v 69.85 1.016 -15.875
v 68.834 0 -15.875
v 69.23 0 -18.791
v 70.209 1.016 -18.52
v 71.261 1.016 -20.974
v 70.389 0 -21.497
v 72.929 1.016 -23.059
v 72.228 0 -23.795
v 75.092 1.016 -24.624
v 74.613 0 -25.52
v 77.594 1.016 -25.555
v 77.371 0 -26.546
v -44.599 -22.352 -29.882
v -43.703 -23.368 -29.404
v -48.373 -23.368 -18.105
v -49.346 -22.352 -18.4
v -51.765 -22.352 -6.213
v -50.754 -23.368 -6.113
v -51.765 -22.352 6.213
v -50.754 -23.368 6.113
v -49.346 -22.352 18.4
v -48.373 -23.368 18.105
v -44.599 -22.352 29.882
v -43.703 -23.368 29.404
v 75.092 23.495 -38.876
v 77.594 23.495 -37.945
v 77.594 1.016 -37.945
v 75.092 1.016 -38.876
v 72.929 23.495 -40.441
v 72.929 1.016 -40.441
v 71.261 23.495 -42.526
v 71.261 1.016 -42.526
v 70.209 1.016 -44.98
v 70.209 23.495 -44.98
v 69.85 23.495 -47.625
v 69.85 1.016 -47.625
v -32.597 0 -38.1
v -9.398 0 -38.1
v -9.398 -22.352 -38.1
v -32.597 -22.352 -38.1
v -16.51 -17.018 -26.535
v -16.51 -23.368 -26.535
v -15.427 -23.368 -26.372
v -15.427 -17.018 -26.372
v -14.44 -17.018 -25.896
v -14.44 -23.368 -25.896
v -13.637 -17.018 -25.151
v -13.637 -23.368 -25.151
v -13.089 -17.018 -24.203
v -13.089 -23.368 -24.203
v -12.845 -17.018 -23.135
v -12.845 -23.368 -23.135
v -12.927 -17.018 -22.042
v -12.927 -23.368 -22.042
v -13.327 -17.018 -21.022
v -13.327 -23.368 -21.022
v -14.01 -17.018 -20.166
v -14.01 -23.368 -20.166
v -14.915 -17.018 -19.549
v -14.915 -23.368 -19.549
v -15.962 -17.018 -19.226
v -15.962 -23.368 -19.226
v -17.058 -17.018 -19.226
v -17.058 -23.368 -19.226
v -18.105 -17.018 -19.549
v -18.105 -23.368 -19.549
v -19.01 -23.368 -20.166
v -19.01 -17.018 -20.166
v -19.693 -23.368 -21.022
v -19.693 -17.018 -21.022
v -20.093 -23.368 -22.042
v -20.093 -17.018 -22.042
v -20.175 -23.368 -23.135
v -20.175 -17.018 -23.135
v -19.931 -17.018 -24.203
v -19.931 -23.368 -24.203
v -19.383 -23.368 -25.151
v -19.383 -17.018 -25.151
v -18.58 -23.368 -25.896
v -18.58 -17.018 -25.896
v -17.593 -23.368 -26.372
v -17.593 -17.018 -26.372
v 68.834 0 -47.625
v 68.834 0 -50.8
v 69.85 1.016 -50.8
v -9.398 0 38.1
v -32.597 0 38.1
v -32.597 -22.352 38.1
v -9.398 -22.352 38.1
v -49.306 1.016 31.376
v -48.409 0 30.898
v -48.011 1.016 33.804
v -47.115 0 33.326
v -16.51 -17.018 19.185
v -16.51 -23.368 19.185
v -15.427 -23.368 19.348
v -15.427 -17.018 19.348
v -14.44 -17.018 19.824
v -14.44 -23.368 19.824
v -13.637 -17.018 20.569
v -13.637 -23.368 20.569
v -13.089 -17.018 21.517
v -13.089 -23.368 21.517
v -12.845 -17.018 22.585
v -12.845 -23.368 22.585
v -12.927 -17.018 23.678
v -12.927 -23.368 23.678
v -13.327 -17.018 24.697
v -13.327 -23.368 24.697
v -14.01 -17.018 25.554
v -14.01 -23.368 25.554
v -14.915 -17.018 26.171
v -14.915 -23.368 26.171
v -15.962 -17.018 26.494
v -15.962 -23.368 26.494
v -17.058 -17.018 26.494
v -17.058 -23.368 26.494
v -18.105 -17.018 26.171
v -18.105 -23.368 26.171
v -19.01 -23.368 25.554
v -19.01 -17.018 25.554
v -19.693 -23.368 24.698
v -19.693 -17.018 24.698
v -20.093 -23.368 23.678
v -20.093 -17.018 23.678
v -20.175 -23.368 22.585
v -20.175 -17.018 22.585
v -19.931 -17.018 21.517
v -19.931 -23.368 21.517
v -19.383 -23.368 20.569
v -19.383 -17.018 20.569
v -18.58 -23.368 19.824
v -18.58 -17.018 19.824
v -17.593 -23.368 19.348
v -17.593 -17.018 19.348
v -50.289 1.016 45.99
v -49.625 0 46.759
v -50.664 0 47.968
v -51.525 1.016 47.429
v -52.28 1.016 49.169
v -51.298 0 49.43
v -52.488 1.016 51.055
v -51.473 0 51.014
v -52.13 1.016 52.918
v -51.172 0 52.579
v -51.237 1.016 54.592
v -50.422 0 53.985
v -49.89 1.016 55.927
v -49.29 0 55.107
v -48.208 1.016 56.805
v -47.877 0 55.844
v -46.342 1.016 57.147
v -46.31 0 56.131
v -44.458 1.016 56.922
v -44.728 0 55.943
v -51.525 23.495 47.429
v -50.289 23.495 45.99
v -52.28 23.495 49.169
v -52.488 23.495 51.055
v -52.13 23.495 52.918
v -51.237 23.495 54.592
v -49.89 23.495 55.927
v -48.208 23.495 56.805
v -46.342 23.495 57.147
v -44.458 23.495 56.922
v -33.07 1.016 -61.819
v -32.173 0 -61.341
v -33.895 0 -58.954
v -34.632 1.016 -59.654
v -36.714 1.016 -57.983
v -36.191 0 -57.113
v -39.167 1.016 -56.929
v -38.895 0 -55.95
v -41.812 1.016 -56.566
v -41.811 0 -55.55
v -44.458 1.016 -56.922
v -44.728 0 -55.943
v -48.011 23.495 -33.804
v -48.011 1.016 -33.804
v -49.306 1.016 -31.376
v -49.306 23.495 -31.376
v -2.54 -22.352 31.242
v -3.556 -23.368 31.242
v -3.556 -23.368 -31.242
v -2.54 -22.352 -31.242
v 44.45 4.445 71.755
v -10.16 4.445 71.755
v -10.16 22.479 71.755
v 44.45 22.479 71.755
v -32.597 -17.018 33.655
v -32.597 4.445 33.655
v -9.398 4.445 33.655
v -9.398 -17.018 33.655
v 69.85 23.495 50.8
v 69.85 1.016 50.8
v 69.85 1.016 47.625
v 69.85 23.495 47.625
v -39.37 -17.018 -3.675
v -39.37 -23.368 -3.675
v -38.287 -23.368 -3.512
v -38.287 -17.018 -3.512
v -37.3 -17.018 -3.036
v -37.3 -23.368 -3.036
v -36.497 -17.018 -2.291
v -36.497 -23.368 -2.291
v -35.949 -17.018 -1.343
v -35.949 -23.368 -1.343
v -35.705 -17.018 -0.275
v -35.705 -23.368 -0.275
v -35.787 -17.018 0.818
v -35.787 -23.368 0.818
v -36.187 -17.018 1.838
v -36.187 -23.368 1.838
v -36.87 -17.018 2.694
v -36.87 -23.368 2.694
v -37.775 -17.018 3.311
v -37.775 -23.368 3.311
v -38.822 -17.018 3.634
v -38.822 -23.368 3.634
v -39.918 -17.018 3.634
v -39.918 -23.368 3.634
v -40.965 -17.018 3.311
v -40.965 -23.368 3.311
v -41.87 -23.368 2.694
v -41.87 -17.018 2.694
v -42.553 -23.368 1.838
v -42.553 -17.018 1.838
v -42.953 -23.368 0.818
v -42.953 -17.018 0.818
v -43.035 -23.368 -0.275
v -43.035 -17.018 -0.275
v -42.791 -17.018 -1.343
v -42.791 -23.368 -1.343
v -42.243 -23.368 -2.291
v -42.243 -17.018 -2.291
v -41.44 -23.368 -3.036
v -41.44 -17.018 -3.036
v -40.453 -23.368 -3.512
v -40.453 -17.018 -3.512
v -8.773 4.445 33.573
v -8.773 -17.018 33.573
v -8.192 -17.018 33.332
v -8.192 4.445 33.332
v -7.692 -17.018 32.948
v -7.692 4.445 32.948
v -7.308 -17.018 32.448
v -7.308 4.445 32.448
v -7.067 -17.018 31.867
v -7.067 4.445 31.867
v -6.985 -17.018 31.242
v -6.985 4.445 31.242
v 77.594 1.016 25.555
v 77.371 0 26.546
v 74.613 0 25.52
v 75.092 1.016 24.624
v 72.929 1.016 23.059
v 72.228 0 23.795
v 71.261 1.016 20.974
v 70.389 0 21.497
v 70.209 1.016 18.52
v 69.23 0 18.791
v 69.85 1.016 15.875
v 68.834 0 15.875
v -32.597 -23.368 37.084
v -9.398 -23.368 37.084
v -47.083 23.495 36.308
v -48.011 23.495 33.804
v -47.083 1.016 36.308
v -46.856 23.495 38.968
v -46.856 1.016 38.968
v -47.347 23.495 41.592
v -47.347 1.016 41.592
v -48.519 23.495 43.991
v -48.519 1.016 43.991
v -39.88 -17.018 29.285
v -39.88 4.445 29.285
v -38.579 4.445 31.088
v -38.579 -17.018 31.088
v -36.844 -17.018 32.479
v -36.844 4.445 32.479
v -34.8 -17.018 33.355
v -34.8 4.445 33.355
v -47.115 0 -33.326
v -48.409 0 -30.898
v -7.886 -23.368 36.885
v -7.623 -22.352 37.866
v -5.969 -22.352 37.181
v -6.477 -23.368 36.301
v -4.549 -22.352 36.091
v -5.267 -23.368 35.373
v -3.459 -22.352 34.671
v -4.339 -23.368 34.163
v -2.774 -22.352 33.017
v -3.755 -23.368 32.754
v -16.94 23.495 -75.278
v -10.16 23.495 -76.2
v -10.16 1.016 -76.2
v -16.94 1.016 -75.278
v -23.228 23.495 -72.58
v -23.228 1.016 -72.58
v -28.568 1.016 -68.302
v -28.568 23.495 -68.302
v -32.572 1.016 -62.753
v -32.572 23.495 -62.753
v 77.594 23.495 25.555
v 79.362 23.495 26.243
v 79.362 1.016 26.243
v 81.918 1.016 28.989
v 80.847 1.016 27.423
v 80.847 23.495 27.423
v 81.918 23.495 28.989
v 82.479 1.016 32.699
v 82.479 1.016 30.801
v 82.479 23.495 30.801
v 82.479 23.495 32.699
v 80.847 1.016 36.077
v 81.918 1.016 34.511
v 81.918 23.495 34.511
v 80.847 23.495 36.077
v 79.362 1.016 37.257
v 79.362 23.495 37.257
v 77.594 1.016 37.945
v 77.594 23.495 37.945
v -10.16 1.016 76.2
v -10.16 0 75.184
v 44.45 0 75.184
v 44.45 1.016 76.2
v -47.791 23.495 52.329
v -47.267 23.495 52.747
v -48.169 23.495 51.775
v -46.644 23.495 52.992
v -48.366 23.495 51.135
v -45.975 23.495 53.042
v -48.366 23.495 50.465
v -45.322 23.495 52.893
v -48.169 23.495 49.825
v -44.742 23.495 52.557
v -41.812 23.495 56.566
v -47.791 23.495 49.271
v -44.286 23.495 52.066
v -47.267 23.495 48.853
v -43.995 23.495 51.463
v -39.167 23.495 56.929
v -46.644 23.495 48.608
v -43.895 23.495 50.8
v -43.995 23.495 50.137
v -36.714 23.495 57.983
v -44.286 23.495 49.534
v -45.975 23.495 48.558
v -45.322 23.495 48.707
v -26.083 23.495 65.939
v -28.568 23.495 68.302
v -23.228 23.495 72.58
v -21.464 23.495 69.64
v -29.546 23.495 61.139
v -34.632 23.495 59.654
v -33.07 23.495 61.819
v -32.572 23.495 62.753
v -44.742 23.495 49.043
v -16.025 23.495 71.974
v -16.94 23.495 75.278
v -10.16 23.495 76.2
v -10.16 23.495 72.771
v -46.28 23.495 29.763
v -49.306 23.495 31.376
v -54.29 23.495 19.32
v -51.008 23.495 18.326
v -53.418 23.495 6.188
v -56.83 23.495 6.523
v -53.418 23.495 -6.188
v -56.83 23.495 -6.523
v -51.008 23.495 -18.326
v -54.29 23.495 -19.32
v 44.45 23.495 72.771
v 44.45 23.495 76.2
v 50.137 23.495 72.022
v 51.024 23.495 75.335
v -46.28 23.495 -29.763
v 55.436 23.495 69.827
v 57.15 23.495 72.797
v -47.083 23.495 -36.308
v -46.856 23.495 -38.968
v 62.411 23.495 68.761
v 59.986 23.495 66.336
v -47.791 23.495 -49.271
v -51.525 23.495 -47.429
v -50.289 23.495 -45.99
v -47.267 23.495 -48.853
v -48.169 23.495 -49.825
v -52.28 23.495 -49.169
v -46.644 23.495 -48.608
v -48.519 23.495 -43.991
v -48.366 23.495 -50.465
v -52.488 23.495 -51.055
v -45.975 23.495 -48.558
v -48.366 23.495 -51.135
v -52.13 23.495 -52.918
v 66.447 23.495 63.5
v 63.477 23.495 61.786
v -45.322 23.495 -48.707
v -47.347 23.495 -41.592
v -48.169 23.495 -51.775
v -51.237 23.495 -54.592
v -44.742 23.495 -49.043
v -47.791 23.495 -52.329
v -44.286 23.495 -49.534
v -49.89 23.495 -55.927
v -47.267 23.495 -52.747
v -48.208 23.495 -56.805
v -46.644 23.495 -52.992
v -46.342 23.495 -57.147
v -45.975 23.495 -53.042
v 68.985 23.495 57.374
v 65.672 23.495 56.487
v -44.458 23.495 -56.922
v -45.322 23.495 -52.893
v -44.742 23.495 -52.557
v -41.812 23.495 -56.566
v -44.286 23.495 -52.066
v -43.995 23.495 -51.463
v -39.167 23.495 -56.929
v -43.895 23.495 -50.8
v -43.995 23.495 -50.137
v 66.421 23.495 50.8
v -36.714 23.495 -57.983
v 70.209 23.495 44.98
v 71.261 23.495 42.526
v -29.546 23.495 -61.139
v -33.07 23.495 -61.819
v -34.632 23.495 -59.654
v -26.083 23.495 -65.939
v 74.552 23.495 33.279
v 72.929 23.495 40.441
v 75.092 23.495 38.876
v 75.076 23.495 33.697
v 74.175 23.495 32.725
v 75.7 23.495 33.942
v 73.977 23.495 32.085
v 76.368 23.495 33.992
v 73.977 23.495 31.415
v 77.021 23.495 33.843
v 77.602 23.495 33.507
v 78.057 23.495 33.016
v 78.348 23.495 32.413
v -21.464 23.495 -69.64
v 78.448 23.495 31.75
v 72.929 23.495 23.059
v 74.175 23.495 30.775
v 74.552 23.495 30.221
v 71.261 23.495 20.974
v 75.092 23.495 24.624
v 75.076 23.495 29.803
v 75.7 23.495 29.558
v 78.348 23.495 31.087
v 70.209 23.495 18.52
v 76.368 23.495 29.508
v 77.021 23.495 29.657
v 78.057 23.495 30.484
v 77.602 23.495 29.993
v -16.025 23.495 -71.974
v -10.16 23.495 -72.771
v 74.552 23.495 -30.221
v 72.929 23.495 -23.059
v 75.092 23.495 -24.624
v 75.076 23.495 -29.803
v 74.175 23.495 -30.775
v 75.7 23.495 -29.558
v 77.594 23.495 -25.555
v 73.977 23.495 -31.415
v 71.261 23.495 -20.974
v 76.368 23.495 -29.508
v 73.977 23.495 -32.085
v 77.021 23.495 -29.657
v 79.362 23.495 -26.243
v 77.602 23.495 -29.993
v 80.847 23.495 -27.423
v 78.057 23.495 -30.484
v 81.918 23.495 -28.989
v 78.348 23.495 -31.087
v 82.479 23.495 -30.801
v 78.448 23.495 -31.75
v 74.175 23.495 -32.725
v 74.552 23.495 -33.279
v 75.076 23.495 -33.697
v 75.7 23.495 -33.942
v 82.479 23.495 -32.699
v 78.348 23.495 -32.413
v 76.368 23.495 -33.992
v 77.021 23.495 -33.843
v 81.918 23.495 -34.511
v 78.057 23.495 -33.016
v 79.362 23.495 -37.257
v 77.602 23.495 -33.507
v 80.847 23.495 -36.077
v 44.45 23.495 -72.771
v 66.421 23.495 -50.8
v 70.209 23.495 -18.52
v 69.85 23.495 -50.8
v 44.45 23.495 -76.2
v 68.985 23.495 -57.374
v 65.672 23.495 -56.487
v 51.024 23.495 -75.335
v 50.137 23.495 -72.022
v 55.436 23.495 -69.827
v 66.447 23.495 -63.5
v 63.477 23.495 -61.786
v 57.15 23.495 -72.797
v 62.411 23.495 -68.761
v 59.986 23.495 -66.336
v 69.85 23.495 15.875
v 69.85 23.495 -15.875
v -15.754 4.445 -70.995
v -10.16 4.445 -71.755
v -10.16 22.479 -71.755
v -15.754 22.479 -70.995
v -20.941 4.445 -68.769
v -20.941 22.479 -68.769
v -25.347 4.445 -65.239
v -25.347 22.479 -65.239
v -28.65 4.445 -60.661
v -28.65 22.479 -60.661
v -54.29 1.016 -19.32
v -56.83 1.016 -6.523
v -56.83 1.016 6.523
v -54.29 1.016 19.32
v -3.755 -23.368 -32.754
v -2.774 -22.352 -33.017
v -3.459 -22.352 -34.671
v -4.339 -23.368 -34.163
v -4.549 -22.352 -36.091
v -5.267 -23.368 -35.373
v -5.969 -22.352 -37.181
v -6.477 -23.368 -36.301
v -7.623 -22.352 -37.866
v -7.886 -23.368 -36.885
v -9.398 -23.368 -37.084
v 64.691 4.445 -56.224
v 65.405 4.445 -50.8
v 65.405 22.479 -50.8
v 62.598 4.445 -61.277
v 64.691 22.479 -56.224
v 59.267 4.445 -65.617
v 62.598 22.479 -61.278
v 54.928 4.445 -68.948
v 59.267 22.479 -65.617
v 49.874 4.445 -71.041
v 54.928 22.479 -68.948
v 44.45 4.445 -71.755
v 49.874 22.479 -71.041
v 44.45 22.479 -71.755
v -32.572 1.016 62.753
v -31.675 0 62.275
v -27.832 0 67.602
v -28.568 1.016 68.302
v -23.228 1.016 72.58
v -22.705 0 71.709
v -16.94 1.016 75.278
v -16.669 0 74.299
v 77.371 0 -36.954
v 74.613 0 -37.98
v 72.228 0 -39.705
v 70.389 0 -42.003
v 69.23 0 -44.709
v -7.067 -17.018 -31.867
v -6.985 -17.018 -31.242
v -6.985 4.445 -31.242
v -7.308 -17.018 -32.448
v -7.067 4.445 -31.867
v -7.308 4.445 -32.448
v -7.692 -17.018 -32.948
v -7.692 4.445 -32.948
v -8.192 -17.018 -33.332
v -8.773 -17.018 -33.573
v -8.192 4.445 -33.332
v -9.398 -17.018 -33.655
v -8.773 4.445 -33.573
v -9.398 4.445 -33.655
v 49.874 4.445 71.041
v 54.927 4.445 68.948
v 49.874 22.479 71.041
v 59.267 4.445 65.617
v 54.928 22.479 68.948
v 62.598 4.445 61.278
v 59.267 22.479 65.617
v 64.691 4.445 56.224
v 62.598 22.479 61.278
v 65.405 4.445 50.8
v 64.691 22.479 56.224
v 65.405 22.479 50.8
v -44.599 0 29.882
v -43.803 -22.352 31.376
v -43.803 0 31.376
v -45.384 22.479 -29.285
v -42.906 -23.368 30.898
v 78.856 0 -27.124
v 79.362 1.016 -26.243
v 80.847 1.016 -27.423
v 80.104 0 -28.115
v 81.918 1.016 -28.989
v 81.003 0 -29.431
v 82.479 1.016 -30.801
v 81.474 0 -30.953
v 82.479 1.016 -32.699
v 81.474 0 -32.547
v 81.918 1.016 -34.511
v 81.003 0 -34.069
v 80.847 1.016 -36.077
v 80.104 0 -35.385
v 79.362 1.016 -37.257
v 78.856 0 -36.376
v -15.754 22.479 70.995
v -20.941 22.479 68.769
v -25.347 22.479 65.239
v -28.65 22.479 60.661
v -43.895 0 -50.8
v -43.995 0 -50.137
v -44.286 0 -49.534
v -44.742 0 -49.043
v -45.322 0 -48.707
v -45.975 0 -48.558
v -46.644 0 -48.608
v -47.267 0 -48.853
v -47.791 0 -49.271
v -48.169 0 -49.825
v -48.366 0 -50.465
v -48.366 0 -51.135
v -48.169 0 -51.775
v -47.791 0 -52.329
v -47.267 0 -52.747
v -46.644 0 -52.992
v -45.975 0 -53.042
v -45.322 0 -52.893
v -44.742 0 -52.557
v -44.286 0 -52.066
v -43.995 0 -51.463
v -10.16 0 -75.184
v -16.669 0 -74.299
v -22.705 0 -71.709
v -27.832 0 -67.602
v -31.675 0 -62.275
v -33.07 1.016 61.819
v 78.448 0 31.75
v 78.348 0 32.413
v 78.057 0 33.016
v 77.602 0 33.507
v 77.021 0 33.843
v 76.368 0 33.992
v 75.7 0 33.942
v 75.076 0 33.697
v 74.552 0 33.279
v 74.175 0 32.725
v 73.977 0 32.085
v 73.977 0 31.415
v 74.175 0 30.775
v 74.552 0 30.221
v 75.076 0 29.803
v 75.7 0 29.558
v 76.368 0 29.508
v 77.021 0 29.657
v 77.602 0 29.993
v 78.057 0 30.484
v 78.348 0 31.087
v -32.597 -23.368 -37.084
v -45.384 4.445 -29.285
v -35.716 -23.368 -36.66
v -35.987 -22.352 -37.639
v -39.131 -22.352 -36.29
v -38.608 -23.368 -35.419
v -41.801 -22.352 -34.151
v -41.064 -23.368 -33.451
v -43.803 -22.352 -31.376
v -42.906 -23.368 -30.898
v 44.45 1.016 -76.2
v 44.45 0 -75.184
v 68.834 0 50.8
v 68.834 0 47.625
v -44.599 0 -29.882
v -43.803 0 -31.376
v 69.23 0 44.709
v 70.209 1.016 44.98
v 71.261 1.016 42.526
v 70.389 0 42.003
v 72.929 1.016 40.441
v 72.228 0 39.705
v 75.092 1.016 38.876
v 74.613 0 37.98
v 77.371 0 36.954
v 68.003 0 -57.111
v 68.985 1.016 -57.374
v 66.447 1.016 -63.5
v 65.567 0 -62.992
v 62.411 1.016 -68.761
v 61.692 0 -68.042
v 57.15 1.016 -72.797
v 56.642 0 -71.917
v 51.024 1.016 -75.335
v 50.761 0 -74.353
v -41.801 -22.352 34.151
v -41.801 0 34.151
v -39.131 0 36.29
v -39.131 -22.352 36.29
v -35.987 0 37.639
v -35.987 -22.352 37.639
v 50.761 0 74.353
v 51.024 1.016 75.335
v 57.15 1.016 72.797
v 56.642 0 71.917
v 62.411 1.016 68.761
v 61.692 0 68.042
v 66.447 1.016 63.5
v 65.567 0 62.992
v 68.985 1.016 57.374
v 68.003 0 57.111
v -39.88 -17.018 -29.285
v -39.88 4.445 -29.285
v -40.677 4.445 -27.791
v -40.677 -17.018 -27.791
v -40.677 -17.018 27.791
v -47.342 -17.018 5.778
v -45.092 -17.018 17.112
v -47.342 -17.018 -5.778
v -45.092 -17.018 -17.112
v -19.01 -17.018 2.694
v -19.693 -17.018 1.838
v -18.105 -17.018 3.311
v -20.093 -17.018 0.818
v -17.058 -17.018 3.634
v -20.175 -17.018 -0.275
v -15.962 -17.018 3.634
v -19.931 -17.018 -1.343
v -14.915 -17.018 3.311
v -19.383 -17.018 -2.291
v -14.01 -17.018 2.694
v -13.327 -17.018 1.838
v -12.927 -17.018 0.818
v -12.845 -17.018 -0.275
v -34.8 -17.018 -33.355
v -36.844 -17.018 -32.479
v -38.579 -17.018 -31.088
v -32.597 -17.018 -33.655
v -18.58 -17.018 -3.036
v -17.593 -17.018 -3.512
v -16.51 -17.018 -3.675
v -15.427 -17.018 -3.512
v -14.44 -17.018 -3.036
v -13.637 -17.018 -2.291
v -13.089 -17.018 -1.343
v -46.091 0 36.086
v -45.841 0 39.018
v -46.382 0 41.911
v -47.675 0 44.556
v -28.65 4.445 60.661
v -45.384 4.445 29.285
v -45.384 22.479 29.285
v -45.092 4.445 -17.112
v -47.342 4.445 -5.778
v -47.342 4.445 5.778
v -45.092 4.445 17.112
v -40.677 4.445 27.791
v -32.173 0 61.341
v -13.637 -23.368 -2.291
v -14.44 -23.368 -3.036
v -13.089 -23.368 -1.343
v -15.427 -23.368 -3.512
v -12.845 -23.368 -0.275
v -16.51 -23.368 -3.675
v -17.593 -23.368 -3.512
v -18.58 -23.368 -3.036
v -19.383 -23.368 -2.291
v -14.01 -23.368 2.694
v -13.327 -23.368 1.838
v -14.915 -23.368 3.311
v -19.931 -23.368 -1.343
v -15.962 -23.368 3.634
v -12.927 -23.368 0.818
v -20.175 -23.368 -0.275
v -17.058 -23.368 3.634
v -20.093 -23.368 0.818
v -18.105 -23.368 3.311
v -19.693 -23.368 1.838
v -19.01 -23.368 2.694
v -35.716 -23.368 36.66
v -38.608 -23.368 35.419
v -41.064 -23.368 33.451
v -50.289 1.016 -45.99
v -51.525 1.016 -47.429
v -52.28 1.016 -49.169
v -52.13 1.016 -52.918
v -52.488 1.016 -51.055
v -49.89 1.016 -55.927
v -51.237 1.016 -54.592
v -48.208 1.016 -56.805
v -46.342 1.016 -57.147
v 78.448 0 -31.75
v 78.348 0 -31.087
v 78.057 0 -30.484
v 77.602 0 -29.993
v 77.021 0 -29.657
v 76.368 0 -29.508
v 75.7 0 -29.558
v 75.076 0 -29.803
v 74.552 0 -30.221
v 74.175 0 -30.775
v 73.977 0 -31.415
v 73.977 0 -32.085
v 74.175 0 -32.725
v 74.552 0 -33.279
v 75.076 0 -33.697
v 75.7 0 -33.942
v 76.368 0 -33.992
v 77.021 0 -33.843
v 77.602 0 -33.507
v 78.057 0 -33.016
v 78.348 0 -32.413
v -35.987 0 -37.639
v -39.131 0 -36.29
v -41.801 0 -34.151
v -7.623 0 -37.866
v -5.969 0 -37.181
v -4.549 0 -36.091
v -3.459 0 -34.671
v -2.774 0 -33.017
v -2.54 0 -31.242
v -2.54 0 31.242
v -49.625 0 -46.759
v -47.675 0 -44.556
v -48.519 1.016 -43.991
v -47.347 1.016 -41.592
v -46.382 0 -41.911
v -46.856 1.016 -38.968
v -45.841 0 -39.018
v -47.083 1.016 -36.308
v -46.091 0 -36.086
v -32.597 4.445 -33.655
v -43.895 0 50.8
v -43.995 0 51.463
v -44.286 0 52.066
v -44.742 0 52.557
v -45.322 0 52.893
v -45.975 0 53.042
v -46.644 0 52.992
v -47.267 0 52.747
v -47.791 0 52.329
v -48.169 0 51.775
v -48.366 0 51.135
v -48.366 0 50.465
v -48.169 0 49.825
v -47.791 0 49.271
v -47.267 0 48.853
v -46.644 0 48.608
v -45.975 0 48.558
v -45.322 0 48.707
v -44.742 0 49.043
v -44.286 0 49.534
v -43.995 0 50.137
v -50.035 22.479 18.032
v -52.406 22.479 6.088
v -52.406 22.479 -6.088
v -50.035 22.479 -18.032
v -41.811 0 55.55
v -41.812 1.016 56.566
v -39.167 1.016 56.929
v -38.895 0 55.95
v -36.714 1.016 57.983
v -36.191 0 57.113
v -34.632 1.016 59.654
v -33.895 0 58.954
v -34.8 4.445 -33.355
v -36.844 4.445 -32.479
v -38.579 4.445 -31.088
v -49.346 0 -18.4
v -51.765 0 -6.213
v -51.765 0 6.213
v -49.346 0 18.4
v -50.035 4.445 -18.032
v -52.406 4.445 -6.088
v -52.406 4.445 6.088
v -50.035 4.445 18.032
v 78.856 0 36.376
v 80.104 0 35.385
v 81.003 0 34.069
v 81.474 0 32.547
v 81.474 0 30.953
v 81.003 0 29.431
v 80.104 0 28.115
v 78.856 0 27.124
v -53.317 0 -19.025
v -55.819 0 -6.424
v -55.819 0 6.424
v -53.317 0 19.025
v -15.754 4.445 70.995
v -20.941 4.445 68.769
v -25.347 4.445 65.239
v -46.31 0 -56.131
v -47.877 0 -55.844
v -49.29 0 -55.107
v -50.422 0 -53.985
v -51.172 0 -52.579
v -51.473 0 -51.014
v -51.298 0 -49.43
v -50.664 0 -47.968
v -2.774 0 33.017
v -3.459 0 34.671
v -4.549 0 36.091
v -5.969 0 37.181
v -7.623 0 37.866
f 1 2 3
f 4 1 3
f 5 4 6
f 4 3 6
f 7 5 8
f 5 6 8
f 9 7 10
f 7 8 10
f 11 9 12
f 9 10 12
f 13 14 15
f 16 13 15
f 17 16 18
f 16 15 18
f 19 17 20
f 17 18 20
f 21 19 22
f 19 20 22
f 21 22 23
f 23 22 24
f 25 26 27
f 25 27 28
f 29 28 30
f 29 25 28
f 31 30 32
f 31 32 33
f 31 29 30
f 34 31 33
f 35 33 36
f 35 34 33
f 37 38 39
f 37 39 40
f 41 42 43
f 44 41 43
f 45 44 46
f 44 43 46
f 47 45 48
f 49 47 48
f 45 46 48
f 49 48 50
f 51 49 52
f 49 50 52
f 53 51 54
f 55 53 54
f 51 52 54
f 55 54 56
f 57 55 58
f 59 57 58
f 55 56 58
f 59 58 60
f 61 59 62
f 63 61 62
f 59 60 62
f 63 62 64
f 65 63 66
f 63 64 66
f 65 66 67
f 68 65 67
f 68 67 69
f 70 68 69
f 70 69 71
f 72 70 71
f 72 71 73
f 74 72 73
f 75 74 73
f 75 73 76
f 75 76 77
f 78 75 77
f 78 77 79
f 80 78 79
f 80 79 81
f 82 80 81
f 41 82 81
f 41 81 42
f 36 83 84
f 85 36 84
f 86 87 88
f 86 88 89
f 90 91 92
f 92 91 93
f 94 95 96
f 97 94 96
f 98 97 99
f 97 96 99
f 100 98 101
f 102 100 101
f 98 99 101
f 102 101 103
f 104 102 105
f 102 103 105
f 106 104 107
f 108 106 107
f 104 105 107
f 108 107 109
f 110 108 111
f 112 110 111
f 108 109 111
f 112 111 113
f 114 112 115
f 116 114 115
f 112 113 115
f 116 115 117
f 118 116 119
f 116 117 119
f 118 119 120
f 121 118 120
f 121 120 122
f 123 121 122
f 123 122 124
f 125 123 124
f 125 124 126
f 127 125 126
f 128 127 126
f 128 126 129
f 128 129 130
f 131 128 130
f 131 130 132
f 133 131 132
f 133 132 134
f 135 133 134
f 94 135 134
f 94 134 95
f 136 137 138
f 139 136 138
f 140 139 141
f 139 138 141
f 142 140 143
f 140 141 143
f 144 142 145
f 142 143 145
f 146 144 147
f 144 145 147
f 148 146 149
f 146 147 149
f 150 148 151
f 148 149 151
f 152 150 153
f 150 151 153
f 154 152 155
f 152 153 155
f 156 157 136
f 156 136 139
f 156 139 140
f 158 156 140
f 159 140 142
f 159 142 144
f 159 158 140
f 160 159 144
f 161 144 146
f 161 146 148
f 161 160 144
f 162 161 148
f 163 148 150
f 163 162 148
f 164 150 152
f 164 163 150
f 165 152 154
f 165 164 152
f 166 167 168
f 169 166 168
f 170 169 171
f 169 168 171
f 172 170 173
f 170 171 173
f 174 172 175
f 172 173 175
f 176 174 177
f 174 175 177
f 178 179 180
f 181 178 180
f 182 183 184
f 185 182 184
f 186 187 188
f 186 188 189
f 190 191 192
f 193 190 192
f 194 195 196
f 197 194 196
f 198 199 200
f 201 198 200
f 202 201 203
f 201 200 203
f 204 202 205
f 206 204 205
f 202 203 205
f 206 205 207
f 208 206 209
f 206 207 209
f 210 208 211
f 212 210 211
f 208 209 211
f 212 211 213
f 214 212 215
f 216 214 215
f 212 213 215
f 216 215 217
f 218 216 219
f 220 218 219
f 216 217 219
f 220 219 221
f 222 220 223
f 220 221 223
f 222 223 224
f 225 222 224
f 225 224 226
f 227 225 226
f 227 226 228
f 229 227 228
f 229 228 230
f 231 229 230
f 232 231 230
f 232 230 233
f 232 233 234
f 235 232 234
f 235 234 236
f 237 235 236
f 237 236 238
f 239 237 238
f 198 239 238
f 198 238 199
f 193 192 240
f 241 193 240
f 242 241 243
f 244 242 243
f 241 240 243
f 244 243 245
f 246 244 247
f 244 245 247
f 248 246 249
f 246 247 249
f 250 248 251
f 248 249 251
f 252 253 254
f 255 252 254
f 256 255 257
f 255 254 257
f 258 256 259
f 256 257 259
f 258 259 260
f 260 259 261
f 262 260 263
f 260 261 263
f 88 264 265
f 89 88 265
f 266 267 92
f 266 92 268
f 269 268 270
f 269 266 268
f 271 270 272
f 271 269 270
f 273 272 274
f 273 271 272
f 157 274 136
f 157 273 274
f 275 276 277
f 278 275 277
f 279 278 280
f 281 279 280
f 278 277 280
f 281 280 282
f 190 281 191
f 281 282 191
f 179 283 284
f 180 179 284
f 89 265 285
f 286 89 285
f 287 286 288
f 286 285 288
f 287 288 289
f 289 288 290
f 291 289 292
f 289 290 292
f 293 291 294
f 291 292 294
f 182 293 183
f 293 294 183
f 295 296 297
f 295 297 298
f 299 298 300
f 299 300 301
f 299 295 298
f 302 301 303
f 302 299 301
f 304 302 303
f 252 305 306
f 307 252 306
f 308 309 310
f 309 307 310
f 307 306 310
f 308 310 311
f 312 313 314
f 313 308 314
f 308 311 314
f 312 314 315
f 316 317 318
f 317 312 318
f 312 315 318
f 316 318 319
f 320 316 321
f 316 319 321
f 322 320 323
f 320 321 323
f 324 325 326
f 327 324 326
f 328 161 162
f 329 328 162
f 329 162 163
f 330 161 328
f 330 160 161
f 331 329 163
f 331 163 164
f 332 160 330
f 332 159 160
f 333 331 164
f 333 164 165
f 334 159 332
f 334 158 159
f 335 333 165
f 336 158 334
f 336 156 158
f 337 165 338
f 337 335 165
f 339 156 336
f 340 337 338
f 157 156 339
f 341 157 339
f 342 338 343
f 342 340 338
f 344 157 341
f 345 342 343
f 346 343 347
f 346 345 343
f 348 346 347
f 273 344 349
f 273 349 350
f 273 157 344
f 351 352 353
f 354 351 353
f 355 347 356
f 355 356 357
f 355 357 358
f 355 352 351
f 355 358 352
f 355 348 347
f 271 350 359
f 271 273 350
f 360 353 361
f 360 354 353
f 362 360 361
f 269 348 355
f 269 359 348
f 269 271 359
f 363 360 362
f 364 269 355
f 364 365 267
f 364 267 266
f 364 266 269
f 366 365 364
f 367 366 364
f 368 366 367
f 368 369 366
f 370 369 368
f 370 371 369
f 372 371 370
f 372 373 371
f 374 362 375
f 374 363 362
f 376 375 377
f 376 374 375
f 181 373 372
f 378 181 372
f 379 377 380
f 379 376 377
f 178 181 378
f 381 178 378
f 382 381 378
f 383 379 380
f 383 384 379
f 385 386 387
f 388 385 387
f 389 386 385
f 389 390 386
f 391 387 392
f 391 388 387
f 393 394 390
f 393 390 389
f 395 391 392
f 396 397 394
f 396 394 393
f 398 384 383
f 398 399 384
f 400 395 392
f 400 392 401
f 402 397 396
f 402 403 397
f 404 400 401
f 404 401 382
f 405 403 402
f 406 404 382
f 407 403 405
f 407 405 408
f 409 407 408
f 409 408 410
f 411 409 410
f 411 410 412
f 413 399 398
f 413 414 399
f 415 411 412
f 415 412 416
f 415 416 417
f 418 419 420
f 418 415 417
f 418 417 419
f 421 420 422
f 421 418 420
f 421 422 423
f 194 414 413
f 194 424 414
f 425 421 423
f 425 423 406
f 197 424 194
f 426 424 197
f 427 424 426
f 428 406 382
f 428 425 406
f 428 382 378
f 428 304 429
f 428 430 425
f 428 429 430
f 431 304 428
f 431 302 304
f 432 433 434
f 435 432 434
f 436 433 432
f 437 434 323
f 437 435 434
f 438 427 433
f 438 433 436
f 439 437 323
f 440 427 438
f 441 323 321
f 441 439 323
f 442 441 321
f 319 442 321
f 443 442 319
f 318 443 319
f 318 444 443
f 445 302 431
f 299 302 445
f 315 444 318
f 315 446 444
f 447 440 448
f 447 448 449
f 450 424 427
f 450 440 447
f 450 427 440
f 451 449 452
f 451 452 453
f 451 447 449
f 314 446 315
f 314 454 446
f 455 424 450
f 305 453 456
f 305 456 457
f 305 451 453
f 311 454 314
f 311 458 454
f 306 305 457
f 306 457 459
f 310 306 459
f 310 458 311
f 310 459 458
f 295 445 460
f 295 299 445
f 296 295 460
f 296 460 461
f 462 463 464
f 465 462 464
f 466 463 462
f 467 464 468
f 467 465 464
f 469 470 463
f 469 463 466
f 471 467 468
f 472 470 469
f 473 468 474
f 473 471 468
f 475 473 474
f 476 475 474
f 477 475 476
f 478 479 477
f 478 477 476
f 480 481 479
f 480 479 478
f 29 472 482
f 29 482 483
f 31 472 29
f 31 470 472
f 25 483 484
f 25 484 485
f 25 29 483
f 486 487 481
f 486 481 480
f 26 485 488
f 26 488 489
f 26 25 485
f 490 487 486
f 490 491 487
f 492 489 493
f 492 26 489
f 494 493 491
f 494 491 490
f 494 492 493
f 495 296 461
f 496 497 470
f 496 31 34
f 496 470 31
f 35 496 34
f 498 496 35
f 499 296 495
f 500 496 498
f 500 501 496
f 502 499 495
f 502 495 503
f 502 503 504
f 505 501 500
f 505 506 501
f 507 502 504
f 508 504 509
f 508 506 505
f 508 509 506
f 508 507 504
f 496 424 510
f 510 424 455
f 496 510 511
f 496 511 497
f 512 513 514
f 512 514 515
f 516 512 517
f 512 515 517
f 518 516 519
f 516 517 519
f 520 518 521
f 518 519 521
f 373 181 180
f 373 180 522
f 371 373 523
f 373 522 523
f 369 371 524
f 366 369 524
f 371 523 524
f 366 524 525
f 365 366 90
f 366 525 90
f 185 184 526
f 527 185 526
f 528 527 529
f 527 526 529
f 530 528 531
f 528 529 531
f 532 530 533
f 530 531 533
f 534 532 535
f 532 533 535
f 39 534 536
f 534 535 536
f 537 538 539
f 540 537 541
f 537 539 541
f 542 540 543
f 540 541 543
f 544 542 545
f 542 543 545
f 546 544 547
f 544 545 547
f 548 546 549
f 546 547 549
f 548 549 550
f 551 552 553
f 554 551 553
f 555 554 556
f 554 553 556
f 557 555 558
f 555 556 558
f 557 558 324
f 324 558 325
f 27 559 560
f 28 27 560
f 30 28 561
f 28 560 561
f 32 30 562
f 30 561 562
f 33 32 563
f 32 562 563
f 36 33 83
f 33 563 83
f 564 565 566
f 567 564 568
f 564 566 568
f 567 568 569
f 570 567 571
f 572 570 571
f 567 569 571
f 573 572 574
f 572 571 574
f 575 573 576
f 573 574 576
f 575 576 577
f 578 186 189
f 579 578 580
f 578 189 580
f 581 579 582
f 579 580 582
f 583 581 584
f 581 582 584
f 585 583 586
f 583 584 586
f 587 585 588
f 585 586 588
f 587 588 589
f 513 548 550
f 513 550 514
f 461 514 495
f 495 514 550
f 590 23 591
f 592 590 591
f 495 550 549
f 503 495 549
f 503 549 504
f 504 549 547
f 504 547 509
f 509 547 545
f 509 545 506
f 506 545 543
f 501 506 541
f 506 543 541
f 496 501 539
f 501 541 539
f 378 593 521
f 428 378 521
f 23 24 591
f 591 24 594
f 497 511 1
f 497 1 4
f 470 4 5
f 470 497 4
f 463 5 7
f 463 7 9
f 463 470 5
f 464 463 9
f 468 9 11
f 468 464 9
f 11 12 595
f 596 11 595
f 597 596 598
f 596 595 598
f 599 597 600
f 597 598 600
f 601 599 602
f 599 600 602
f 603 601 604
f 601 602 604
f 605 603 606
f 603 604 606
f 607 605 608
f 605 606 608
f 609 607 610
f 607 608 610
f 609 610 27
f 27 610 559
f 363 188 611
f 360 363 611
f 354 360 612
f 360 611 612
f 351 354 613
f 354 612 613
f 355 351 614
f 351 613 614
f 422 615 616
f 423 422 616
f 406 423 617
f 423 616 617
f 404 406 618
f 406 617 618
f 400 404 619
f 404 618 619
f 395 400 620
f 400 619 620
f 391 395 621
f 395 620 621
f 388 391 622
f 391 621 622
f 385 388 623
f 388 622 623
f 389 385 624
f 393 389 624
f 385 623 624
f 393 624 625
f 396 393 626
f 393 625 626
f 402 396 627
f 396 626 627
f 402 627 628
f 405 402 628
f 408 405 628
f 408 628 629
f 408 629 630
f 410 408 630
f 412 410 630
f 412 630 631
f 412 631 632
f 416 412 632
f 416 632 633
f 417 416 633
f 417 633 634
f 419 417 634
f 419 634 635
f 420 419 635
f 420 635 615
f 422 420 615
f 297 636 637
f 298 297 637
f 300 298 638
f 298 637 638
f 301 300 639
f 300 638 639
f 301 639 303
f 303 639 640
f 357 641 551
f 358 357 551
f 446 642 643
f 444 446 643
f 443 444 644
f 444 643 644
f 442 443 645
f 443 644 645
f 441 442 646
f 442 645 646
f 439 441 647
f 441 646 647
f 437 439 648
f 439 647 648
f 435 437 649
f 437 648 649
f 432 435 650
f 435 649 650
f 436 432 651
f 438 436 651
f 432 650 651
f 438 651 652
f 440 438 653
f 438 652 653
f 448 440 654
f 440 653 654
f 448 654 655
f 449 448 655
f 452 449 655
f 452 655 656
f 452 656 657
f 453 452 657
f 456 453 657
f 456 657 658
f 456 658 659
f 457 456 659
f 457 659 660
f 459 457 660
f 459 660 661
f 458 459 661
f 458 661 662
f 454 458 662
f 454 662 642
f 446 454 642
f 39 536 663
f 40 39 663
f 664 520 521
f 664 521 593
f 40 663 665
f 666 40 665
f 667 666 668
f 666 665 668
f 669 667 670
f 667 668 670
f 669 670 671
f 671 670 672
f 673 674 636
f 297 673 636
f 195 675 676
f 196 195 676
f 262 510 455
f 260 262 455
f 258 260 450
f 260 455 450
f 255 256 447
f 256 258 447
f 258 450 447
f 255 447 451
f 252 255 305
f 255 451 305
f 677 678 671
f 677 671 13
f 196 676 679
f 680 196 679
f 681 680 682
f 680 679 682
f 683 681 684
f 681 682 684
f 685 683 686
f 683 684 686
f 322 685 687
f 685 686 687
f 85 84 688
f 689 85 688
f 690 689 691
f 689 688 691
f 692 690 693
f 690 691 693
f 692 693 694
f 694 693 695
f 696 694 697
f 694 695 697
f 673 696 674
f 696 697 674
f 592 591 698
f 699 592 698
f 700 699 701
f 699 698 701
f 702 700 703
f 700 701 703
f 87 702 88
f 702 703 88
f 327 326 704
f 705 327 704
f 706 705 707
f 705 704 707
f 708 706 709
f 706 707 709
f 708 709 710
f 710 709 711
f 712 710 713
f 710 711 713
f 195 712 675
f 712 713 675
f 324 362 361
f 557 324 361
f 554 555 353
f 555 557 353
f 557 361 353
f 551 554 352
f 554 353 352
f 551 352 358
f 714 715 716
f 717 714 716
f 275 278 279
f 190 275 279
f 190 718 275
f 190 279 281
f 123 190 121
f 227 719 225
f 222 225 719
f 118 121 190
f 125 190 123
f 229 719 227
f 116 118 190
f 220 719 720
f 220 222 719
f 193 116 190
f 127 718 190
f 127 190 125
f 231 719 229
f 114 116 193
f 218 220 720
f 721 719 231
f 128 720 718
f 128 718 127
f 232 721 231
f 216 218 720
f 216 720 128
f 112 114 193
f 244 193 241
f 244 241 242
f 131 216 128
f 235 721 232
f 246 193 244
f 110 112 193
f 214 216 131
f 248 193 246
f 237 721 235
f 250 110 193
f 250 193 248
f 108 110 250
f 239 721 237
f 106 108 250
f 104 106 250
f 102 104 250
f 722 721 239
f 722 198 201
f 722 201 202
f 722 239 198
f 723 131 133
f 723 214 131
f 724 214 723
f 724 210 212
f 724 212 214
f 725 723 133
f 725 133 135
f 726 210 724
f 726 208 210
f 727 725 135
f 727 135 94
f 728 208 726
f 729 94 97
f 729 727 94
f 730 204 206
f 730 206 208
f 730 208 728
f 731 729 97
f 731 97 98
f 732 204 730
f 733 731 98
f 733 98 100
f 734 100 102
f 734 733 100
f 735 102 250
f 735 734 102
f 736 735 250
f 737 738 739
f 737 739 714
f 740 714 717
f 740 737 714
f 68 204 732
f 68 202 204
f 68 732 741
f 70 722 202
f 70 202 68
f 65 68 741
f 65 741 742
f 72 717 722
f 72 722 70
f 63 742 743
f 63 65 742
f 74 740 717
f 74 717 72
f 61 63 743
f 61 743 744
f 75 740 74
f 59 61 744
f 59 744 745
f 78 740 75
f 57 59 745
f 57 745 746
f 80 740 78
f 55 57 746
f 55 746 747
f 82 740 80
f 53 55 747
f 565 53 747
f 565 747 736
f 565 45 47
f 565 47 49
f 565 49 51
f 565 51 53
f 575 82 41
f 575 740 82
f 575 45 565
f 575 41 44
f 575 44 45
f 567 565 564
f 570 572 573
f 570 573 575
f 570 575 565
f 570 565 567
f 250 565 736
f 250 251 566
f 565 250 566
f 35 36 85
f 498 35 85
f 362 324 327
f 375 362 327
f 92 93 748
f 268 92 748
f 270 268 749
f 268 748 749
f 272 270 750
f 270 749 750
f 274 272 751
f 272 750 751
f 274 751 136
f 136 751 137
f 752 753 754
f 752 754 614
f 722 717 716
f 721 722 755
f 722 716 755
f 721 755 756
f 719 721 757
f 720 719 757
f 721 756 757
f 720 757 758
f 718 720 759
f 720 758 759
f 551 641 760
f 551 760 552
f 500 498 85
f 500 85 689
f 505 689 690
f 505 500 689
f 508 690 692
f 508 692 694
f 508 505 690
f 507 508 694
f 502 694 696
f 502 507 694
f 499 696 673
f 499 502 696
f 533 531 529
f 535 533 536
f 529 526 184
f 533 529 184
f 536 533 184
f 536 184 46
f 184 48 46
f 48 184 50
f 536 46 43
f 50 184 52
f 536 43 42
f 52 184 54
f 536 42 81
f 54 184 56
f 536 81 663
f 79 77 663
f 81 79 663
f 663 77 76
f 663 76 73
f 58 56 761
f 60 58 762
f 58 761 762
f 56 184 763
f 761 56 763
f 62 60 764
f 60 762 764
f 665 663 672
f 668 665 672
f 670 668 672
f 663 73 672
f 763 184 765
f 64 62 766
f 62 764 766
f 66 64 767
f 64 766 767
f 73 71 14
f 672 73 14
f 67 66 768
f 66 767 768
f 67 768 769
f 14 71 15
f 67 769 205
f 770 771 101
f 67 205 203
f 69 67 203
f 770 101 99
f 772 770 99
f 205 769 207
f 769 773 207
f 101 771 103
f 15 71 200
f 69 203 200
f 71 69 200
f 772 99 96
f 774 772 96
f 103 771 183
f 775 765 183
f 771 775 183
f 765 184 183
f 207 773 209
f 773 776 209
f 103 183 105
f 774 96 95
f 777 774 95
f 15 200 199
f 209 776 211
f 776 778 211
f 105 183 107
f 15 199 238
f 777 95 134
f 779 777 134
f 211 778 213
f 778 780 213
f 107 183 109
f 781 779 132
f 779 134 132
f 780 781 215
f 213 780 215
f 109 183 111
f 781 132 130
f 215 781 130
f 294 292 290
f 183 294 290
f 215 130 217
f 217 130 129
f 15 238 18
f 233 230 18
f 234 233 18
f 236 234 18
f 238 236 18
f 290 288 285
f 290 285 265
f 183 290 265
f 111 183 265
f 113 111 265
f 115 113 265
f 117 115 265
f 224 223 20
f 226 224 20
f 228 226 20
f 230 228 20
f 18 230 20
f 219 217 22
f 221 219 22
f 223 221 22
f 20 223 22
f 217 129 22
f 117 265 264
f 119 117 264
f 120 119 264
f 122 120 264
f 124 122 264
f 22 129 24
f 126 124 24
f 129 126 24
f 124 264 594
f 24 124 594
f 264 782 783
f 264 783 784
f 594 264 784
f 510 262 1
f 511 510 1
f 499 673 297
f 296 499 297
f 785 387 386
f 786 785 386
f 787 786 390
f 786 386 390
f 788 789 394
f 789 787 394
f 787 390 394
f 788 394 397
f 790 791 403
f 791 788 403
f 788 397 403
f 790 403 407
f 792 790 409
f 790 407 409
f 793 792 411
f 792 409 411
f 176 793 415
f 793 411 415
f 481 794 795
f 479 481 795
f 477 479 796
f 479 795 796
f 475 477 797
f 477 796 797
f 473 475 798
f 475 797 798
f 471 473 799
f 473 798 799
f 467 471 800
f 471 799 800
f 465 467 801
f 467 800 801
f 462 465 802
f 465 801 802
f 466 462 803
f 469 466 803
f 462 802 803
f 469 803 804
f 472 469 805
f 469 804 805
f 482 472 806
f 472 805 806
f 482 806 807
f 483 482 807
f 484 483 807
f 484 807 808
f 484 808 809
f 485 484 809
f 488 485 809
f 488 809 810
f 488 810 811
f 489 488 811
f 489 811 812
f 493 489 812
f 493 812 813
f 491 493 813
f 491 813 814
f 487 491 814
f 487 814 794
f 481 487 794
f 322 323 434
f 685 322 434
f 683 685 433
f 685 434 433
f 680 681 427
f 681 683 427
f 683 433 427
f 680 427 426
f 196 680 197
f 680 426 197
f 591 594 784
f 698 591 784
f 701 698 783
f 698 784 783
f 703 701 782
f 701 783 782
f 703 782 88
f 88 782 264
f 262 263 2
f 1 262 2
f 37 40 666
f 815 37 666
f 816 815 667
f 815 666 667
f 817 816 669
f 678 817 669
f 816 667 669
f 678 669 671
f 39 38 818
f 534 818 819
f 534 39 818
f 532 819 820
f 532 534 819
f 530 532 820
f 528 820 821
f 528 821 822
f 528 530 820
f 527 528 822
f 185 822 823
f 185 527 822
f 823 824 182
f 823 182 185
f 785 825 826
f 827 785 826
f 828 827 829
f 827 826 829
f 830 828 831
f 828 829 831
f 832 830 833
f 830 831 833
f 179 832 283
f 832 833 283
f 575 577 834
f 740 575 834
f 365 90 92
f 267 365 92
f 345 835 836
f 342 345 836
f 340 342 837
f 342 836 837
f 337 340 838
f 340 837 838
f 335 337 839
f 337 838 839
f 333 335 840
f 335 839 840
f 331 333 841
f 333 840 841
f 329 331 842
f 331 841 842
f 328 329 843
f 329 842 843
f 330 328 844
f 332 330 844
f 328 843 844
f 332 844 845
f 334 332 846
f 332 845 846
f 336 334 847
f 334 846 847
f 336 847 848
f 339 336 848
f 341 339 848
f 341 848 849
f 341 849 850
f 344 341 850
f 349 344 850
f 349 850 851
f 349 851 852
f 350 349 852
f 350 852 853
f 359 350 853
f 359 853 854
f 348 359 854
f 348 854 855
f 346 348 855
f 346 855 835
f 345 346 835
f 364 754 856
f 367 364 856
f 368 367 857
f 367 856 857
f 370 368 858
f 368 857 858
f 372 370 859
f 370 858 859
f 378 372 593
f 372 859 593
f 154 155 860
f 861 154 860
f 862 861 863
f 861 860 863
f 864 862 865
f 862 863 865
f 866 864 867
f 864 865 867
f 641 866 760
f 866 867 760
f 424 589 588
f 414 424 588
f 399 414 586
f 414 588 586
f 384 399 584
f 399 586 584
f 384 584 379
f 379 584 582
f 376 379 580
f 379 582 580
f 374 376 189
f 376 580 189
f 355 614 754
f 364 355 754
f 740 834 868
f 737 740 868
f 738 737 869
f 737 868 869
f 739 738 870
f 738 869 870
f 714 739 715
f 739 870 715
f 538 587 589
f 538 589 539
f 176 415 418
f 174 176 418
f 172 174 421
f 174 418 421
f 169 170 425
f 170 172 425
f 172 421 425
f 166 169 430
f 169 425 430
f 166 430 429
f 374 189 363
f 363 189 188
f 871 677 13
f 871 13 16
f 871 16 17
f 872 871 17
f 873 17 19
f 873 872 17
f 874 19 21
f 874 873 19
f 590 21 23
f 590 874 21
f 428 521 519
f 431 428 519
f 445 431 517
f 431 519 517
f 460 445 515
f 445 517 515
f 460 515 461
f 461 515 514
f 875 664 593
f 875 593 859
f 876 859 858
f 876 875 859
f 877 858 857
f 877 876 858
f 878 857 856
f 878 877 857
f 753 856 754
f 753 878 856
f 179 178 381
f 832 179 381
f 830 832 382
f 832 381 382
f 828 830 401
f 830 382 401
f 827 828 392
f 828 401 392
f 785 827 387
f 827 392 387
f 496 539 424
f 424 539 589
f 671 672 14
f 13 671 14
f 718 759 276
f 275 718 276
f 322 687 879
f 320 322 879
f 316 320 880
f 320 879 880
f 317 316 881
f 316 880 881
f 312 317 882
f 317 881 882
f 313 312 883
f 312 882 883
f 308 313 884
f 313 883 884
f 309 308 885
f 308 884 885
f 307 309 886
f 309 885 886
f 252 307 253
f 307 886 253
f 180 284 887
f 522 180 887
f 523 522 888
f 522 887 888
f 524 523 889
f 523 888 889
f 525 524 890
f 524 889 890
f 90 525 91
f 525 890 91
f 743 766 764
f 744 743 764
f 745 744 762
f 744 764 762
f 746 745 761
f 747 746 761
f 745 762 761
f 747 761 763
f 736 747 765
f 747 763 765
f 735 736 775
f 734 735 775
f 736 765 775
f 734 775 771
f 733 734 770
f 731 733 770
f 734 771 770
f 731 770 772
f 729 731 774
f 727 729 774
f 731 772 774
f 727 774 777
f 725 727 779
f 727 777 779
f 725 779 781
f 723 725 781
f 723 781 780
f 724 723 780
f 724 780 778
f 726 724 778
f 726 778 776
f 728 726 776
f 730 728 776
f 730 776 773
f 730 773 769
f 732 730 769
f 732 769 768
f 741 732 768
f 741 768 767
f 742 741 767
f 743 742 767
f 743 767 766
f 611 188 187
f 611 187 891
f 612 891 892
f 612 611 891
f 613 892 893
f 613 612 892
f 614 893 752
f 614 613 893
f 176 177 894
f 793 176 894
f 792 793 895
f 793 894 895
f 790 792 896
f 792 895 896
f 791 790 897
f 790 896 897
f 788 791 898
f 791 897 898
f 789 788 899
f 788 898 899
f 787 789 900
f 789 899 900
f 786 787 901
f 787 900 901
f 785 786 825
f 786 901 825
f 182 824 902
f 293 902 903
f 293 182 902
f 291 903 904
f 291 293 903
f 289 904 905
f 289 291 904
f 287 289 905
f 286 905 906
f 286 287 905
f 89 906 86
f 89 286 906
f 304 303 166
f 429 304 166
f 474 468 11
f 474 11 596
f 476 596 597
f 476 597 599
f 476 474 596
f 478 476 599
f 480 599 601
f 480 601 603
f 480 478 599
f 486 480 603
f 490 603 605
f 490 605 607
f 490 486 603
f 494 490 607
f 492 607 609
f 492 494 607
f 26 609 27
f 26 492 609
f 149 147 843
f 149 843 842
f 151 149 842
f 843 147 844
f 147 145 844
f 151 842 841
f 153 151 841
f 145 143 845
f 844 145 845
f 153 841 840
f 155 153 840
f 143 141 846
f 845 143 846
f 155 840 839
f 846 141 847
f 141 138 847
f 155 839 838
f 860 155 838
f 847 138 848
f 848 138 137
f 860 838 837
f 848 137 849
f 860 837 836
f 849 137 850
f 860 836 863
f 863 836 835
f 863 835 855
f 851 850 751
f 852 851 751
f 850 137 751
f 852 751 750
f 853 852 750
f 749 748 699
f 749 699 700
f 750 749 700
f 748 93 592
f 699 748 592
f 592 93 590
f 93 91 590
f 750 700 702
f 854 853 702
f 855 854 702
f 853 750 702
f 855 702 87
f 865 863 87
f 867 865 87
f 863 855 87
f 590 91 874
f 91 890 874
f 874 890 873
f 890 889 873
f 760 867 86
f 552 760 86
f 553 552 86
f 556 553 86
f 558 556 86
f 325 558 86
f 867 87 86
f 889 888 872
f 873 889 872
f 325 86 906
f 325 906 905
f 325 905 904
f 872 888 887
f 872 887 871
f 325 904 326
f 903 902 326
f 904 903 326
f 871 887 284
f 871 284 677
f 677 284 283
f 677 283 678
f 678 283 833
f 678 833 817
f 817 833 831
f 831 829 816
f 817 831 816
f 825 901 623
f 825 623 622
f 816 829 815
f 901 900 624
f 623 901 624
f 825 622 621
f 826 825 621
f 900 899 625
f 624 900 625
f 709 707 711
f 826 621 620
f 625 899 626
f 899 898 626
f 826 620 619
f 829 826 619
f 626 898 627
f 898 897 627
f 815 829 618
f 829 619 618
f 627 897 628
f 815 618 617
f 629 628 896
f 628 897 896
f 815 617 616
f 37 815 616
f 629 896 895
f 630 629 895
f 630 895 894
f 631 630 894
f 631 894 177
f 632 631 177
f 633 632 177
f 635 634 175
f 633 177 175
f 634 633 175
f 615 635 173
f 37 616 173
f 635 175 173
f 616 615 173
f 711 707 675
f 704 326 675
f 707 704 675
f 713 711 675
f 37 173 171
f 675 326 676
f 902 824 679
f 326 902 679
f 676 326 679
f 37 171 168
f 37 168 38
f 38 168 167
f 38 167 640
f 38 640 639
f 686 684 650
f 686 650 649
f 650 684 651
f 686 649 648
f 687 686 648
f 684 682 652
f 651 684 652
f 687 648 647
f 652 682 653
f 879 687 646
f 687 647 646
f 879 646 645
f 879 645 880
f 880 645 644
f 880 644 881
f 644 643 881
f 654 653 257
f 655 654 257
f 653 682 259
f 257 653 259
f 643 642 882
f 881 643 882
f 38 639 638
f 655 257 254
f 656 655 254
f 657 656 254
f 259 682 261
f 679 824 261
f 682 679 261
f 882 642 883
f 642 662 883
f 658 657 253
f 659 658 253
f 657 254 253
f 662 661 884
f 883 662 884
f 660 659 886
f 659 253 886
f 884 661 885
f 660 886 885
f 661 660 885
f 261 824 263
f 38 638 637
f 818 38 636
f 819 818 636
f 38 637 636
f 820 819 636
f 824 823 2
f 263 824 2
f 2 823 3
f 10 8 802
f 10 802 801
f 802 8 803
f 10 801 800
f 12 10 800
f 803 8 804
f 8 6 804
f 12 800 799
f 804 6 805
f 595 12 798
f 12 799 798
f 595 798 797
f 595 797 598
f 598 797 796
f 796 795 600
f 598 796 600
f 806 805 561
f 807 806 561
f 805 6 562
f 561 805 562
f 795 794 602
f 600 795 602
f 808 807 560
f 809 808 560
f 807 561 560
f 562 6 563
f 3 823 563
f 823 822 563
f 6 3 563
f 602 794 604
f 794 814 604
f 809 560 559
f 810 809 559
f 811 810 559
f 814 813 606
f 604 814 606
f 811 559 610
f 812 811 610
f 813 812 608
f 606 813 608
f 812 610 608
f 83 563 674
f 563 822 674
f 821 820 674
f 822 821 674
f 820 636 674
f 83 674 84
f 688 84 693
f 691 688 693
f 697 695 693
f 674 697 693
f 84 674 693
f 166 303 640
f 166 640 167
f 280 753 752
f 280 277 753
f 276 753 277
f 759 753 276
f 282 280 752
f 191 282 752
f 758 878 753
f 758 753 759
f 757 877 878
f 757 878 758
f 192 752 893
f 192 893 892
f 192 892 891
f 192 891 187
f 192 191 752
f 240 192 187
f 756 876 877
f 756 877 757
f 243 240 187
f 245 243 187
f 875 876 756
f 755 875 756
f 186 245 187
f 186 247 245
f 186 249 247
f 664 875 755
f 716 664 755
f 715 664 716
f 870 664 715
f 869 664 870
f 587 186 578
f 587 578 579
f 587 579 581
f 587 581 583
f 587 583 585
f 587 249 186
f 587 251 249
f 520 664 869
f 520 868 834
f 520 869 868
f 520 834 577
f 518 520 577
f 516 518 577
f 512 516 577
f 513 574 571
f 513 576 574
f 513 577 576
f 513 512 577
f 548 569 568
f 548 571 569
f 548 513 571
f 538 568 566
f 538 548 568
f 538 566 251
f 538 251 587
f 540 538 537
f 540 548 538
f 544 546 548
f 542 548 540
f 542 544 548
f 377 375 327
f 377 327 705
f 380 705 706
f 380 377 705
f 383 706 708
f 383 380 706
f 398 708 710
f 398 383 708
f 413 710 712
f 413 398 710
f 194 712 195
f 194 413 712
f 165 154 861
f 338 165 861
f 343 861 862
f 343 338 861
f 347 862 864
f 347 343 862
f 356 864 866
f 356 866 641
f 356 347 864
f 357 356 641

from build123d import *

# Parameters (mm, degrees)
BOSS_EXTRUDE1_DEPTH   = 23.495
FILLET1_R             = 25.4
SHELL1_T              = -4.445
NUB_DEPTH             = 23.368
FILLET2_R             = 12.7
FILLET3_R             = 6.858
CUT_EXTRUDE1_DEPTH    = 21.463
CHAMFER1_SIZE         = 1.016
BOSS_EXTRUDE2_DEPTH   = 23.495
F_8_CLEARANCE_HOLE1_D = 4.4958
CHAMFER2_SIZE         = 1.016
SKETCH14_R            = 3.675
CUT_EXTRUDE2_DEPTH    = 122.72544216


with BuildPart() as part:
    # Sketch1 → Boss-Extrude1 (new body)
    with BuildSketch(Plane(origin=(0, 0, 0), x_dir=(1, 0, 0), z_dir=(0, 1, 0))):
        with BuildLine():
            Line((-25.4, -76.2), (69.85, -76.2))
            Line((69.85, -76.2), (69.85, 76.2))
            Line((69.85, 76.2), (-25.4, 76.2))
            Line((-25.4, 76.2), (-49.305882353, 31.376470588))
            ThreePointArc((-49.305882353, 31.376470588), (-57.15, 0), (-49.305882353, -31.376470588))
            Line((-49.305882353, -31.376470588), (-25.4, -76.2))
        make_face()
    extrude(amount=BOSS_EXTRUDE1_DEPTH)

    # Fillet1
    fillet1_edges = [part.edges().sort_by_distance(p)[0] for p in [
        (69.85, 11.7475, 76.2),
        (-25.4, 11.7475, 76.2),
        (-25.4, 11.7475, -76.2),
        (69.85, 11.7475, -76.2),
    ]]
    fillet(fillet1_edges, radius=FILLET1_R)

    # Shell1
    shell1_openings = [part.faces().sort_by_distance(p)[0] for p in [
        (11.569703313, 23.495, 0),
    ]]
    offset(amount=SHELL1_T, openings=shell1_openings, kind=Kind.INTERSECTION)

    # Sketch13 → nub (add)
    with BuildSketch(Plane.XZ):
        with BuildLine():
            Line((-2.54, 38.1), (-2.54, -38.1))
            Line((-2.54, -38.1), (-40.216666667, -38.1))
            Line((-40.216666667, -38.1), (-44.599411765, -29.882352941))
            ThreePointArc((-44.599411765, -29.882352941), (-52.07, 0), (-44.599411765, 29.882352941))
            Line((-44.599411765, 29.882352941), (-40.216666667, 38.1))
            Line((-40.216666667, 38.1), (-2.54, 38.1))
        make_face()
    extrude(amount=NUB_DEPTH)

    # Fillet2
    fillet2_edges = [part.edges().sort_by_distance(p)[0] for p in [
        (-40.216666667, -11.684, 38.1),
        (-40.216666667, -11.684, -38.1),
    ]]
    fillet(fillet2_edges, radius=FILLET2_R)

    # Fillet3
    fillet3_edges = [part.edges().sort_by_distance(p)[0] for p in [
        (-2.54, -11.684, 38.1),
        (-2.54, -11.684, -38.1),
    ]]
    fillet(fillet3_edges, radius=FILLET3_R)

    # Sketch8 → Cut-Extrude1 (cut)
    with BuildSketch(Plane(origin=(0, 4.445, 0), x_dir=(1, 0, 0), z_dir=(0, 1, 0))):
        with BuildLine():
            Line((-32.596666667, -33.655), (-9.398, -33.655))
            ThreePointArc((-9.398, -33.655), (-7.691751337, -32.948248663), (-6.985, -31.242))
            Line((-6.985, -31.242), (-6.985, 31.242))
            ThreePointArc((-6.985, 31.242), (-7.691751337, 32.948248663), (-9.398, 33.655))
            Line((-9.398, 33.655), (-32.596666667, 33.655))
            ThreePointArc((-32.596666667, 33.655), (-36.843829128, 32.478604102), (-39.880490196, 29.284705882))
            Line((-39.880490196, 29.284705882), (-40.677352941, 27.790588235))
            ThreePointArc((-40.677352941, 27.790588235), (-47.625, 0), (-40.677352941, -27.790588235))
            Line((-40.677352941, -27.790588235), (-39.880490196, -29.284705882))
            ThreePointArc((-39.880490196, -29.284705882), (-36.843829128, -32.478604102), (-32.596666667, -33.655))
        make_face()
    extrude(amount=-CUT_EXTRUDE1_DEPTH, mode=Mode.SUBTRACT)

    # Chamfer1
    chamfer1_edges = [part.edges().sort_by_distance(p)[0] for p in [
        (-37.016764706, 23.495, 44.972941176),
        (-20.941258555, 23.495, 68.768764258),
        (17.145, 23.495, 71.755),
        (59.2674226, 23.495, 65.6174226),
        (65.405, 23.495, 0),
        (59.2674226, 23.495, -65.6174226),
        (17.145, 23.495, -71.755),
        (-20.941258555, 23.495, -68.768764258),
        (-37.016764706, 23.495, -44.972941176),
        (-52.705, 23.495, 0),
    ]]
    chamfer(chamfer1_edges, length=CHAMFER1_SIZE)

    # Sketch10 → Boss-Extrude2 (add)
    with BuildSketch(Plane(origin=(0, 23.495, 0), x_dir=(1, 0, 0), z_dir=(0, 1, 0))):
        with BuildLine():
            Line((69.85, 47.625), (69.85, 15.875))
            ThreePointArc((69.85, 15.875), (72.024192281, 22.073146175), (77.593902439, 25.554878049))
            ThreePointArc((77.593902439, 25.554878049), (82.55, 31.75), (77.593902439, 37.945121951))
            ThreePointArc((77.593902439, 37.945121951), (72.024192281, 41.426853825), (69.85, 47.625))
        make_face()
        with BuildLine():
            Line((69.85, -47.625), (69.85, -15.875))
            ThreePointArc((69.85, -15.875), (72.024192281, -22.073146175), (77.593902439, -25.554878049))
            ThreePointArc((77.593902439, -25.554878049), (82.55, -31.75), (77.593902439, -37.945121951))
            ThreePointArc((77.593902439, -37.945121951), (72.024192281, -41.426853825), (69.85, -47.625))
        make_face()
        with BuildLine():
            Line((-33.069803922, 61.819117647), (-48.010980392, 33.804411765))
            ThreePointArc((-48.010980392, 33.804411765), (-47.012610676, 40.296513581), (-50.288598757, 45.989670014))
            ThreePointArc((-50.288598757, 45.989670014), (-51.74627451, 53.788235294), (-44.457895744, 56.922238164))
            ThreePointArc((-44.457895744, 56.922238164), (-37.904983546, 57.373314449), (-33.069803922, 61.819117647))
        make_face()
        with BuildLine():
            Line((-33.069803922, -61.819117647), (-48.010980392, -33.804411765))
            ThreePointArc((-48.010980392, -33.804411765), (-47.012610676, -40.296513581), (-50.288598757, -45.989670014))
            ThreePointArc((-50.288598757, -45.989670014), (-51.74627451, -53.788235294), (-44.457895744, -56.922238164))
            ThreePointArc((-44.457895744, -56.922238164), (-37.904983546, -57.373314449), (-33.069803922, -61.819117647))
        make_face()
    extrude(amount=-BOSS_EXTRUDE2_DEPTH)

    # #8 Clearance Hole1 (through all)
    with Locations(Plane(origin=(0, 23.495, 0), x_dir=(-1, 0, 0), z_dir=(0, 1, 0))):
        with Locations((46.143333333, -50.8), (46.143333333, 50.8), (-76.2, 31.75), (-76.2, -31.75)):
            Hole(F_8_CLEARANCE_HOLE1_D / 2)

    # Chamfer2
    chamfer2_edges = [part.edges().sort_by_distance(p)[0] for p in [
        (-20.997333333, -23.368, 38.1),
        (-4.548661695, -23.368, 36.091338305),
        (-4.548661695, -23.368, -36.091338305),
        (69.85, 0, -49.2125),
        (72.024192281, 0, -22.073146175),
        (82.55, 0, -31.75),
        (72.024192281, 0, -41.426853825),
        (69.85, 0, 0),
        (72.024192281, 0, 22.073146175),
        (72.024192281, 0, 41.426853825),
        (82.55, 0, 31.75),
        (17.145, 0, 76.2),
        (-48.658431373, 0, -32.590441176),
        (-51.74627451, 0, -53.788235294),
        (-47.012610676, 0, -40.296513581),
        (-37.904983546, 0, -57.373314449),
        (-32.820784314, 0, 62.286029412),
        (-47.012610676, 0, 40.296513581),
        (-51.74627451, 0, 53.788235294),
        (-37.904983546, 0, 57.373314449),
        (69.85, 0, 49.2125),
        (-32.820784314, 0, -62.286029412),
        (17.145, 0, -76.2),
        (-23.228192188, 0, -72.580320313),
        (62.410512242, 0, -68.760512242),
        (62.410512242, 0, 68.760512242),
        (-23.228192188, 0, 72.580320313),
        (-48.658431373, 0, 32.590441176),
        (-57.15, 0, 0),
        (-52.07, -23.368, 0),
        (-44.200980392, -23.368, -30.629411765),
        (-20.997333333, -23.368, -38.1),
        (-44.200980392, -23.368, 30.629411765),
        (-39.130762761, -23.368, 36.290160157),
        (-39.130762761, -23.368, -36.290160157),
        (-2.54, -23.368, 0),
    ]]
    chamfer(chamfer2_edges, length=CHAMFER2_SIZE)

    # Sketch14 → Cut-Extrude2 (cut, through all)
    with BuildSketch(Plane.XZ.offset(23.368)):
        with Locations(Location((-16.51, 22.86, 0), (0, 0, 270))):
            Circle(SKETCH14_R)
        with Locations(Location((-16.51, 0, 0), (0, 0, 270))):
            Circle(SKETCH14_R)
        with Locations(Location((-16.51, -22.86, 0), (0, 0, 270))):
            Circle(SKETCH14_R)
        with Locations(Location((-39.37, 0, 0), (0, 0, 270))):
            Circle(SKETCH14_R)
    extrude(amount=-CUT_EXTRUDE2_DEPTH, mode=Mode.SUBTRACT)


solid = part.part
